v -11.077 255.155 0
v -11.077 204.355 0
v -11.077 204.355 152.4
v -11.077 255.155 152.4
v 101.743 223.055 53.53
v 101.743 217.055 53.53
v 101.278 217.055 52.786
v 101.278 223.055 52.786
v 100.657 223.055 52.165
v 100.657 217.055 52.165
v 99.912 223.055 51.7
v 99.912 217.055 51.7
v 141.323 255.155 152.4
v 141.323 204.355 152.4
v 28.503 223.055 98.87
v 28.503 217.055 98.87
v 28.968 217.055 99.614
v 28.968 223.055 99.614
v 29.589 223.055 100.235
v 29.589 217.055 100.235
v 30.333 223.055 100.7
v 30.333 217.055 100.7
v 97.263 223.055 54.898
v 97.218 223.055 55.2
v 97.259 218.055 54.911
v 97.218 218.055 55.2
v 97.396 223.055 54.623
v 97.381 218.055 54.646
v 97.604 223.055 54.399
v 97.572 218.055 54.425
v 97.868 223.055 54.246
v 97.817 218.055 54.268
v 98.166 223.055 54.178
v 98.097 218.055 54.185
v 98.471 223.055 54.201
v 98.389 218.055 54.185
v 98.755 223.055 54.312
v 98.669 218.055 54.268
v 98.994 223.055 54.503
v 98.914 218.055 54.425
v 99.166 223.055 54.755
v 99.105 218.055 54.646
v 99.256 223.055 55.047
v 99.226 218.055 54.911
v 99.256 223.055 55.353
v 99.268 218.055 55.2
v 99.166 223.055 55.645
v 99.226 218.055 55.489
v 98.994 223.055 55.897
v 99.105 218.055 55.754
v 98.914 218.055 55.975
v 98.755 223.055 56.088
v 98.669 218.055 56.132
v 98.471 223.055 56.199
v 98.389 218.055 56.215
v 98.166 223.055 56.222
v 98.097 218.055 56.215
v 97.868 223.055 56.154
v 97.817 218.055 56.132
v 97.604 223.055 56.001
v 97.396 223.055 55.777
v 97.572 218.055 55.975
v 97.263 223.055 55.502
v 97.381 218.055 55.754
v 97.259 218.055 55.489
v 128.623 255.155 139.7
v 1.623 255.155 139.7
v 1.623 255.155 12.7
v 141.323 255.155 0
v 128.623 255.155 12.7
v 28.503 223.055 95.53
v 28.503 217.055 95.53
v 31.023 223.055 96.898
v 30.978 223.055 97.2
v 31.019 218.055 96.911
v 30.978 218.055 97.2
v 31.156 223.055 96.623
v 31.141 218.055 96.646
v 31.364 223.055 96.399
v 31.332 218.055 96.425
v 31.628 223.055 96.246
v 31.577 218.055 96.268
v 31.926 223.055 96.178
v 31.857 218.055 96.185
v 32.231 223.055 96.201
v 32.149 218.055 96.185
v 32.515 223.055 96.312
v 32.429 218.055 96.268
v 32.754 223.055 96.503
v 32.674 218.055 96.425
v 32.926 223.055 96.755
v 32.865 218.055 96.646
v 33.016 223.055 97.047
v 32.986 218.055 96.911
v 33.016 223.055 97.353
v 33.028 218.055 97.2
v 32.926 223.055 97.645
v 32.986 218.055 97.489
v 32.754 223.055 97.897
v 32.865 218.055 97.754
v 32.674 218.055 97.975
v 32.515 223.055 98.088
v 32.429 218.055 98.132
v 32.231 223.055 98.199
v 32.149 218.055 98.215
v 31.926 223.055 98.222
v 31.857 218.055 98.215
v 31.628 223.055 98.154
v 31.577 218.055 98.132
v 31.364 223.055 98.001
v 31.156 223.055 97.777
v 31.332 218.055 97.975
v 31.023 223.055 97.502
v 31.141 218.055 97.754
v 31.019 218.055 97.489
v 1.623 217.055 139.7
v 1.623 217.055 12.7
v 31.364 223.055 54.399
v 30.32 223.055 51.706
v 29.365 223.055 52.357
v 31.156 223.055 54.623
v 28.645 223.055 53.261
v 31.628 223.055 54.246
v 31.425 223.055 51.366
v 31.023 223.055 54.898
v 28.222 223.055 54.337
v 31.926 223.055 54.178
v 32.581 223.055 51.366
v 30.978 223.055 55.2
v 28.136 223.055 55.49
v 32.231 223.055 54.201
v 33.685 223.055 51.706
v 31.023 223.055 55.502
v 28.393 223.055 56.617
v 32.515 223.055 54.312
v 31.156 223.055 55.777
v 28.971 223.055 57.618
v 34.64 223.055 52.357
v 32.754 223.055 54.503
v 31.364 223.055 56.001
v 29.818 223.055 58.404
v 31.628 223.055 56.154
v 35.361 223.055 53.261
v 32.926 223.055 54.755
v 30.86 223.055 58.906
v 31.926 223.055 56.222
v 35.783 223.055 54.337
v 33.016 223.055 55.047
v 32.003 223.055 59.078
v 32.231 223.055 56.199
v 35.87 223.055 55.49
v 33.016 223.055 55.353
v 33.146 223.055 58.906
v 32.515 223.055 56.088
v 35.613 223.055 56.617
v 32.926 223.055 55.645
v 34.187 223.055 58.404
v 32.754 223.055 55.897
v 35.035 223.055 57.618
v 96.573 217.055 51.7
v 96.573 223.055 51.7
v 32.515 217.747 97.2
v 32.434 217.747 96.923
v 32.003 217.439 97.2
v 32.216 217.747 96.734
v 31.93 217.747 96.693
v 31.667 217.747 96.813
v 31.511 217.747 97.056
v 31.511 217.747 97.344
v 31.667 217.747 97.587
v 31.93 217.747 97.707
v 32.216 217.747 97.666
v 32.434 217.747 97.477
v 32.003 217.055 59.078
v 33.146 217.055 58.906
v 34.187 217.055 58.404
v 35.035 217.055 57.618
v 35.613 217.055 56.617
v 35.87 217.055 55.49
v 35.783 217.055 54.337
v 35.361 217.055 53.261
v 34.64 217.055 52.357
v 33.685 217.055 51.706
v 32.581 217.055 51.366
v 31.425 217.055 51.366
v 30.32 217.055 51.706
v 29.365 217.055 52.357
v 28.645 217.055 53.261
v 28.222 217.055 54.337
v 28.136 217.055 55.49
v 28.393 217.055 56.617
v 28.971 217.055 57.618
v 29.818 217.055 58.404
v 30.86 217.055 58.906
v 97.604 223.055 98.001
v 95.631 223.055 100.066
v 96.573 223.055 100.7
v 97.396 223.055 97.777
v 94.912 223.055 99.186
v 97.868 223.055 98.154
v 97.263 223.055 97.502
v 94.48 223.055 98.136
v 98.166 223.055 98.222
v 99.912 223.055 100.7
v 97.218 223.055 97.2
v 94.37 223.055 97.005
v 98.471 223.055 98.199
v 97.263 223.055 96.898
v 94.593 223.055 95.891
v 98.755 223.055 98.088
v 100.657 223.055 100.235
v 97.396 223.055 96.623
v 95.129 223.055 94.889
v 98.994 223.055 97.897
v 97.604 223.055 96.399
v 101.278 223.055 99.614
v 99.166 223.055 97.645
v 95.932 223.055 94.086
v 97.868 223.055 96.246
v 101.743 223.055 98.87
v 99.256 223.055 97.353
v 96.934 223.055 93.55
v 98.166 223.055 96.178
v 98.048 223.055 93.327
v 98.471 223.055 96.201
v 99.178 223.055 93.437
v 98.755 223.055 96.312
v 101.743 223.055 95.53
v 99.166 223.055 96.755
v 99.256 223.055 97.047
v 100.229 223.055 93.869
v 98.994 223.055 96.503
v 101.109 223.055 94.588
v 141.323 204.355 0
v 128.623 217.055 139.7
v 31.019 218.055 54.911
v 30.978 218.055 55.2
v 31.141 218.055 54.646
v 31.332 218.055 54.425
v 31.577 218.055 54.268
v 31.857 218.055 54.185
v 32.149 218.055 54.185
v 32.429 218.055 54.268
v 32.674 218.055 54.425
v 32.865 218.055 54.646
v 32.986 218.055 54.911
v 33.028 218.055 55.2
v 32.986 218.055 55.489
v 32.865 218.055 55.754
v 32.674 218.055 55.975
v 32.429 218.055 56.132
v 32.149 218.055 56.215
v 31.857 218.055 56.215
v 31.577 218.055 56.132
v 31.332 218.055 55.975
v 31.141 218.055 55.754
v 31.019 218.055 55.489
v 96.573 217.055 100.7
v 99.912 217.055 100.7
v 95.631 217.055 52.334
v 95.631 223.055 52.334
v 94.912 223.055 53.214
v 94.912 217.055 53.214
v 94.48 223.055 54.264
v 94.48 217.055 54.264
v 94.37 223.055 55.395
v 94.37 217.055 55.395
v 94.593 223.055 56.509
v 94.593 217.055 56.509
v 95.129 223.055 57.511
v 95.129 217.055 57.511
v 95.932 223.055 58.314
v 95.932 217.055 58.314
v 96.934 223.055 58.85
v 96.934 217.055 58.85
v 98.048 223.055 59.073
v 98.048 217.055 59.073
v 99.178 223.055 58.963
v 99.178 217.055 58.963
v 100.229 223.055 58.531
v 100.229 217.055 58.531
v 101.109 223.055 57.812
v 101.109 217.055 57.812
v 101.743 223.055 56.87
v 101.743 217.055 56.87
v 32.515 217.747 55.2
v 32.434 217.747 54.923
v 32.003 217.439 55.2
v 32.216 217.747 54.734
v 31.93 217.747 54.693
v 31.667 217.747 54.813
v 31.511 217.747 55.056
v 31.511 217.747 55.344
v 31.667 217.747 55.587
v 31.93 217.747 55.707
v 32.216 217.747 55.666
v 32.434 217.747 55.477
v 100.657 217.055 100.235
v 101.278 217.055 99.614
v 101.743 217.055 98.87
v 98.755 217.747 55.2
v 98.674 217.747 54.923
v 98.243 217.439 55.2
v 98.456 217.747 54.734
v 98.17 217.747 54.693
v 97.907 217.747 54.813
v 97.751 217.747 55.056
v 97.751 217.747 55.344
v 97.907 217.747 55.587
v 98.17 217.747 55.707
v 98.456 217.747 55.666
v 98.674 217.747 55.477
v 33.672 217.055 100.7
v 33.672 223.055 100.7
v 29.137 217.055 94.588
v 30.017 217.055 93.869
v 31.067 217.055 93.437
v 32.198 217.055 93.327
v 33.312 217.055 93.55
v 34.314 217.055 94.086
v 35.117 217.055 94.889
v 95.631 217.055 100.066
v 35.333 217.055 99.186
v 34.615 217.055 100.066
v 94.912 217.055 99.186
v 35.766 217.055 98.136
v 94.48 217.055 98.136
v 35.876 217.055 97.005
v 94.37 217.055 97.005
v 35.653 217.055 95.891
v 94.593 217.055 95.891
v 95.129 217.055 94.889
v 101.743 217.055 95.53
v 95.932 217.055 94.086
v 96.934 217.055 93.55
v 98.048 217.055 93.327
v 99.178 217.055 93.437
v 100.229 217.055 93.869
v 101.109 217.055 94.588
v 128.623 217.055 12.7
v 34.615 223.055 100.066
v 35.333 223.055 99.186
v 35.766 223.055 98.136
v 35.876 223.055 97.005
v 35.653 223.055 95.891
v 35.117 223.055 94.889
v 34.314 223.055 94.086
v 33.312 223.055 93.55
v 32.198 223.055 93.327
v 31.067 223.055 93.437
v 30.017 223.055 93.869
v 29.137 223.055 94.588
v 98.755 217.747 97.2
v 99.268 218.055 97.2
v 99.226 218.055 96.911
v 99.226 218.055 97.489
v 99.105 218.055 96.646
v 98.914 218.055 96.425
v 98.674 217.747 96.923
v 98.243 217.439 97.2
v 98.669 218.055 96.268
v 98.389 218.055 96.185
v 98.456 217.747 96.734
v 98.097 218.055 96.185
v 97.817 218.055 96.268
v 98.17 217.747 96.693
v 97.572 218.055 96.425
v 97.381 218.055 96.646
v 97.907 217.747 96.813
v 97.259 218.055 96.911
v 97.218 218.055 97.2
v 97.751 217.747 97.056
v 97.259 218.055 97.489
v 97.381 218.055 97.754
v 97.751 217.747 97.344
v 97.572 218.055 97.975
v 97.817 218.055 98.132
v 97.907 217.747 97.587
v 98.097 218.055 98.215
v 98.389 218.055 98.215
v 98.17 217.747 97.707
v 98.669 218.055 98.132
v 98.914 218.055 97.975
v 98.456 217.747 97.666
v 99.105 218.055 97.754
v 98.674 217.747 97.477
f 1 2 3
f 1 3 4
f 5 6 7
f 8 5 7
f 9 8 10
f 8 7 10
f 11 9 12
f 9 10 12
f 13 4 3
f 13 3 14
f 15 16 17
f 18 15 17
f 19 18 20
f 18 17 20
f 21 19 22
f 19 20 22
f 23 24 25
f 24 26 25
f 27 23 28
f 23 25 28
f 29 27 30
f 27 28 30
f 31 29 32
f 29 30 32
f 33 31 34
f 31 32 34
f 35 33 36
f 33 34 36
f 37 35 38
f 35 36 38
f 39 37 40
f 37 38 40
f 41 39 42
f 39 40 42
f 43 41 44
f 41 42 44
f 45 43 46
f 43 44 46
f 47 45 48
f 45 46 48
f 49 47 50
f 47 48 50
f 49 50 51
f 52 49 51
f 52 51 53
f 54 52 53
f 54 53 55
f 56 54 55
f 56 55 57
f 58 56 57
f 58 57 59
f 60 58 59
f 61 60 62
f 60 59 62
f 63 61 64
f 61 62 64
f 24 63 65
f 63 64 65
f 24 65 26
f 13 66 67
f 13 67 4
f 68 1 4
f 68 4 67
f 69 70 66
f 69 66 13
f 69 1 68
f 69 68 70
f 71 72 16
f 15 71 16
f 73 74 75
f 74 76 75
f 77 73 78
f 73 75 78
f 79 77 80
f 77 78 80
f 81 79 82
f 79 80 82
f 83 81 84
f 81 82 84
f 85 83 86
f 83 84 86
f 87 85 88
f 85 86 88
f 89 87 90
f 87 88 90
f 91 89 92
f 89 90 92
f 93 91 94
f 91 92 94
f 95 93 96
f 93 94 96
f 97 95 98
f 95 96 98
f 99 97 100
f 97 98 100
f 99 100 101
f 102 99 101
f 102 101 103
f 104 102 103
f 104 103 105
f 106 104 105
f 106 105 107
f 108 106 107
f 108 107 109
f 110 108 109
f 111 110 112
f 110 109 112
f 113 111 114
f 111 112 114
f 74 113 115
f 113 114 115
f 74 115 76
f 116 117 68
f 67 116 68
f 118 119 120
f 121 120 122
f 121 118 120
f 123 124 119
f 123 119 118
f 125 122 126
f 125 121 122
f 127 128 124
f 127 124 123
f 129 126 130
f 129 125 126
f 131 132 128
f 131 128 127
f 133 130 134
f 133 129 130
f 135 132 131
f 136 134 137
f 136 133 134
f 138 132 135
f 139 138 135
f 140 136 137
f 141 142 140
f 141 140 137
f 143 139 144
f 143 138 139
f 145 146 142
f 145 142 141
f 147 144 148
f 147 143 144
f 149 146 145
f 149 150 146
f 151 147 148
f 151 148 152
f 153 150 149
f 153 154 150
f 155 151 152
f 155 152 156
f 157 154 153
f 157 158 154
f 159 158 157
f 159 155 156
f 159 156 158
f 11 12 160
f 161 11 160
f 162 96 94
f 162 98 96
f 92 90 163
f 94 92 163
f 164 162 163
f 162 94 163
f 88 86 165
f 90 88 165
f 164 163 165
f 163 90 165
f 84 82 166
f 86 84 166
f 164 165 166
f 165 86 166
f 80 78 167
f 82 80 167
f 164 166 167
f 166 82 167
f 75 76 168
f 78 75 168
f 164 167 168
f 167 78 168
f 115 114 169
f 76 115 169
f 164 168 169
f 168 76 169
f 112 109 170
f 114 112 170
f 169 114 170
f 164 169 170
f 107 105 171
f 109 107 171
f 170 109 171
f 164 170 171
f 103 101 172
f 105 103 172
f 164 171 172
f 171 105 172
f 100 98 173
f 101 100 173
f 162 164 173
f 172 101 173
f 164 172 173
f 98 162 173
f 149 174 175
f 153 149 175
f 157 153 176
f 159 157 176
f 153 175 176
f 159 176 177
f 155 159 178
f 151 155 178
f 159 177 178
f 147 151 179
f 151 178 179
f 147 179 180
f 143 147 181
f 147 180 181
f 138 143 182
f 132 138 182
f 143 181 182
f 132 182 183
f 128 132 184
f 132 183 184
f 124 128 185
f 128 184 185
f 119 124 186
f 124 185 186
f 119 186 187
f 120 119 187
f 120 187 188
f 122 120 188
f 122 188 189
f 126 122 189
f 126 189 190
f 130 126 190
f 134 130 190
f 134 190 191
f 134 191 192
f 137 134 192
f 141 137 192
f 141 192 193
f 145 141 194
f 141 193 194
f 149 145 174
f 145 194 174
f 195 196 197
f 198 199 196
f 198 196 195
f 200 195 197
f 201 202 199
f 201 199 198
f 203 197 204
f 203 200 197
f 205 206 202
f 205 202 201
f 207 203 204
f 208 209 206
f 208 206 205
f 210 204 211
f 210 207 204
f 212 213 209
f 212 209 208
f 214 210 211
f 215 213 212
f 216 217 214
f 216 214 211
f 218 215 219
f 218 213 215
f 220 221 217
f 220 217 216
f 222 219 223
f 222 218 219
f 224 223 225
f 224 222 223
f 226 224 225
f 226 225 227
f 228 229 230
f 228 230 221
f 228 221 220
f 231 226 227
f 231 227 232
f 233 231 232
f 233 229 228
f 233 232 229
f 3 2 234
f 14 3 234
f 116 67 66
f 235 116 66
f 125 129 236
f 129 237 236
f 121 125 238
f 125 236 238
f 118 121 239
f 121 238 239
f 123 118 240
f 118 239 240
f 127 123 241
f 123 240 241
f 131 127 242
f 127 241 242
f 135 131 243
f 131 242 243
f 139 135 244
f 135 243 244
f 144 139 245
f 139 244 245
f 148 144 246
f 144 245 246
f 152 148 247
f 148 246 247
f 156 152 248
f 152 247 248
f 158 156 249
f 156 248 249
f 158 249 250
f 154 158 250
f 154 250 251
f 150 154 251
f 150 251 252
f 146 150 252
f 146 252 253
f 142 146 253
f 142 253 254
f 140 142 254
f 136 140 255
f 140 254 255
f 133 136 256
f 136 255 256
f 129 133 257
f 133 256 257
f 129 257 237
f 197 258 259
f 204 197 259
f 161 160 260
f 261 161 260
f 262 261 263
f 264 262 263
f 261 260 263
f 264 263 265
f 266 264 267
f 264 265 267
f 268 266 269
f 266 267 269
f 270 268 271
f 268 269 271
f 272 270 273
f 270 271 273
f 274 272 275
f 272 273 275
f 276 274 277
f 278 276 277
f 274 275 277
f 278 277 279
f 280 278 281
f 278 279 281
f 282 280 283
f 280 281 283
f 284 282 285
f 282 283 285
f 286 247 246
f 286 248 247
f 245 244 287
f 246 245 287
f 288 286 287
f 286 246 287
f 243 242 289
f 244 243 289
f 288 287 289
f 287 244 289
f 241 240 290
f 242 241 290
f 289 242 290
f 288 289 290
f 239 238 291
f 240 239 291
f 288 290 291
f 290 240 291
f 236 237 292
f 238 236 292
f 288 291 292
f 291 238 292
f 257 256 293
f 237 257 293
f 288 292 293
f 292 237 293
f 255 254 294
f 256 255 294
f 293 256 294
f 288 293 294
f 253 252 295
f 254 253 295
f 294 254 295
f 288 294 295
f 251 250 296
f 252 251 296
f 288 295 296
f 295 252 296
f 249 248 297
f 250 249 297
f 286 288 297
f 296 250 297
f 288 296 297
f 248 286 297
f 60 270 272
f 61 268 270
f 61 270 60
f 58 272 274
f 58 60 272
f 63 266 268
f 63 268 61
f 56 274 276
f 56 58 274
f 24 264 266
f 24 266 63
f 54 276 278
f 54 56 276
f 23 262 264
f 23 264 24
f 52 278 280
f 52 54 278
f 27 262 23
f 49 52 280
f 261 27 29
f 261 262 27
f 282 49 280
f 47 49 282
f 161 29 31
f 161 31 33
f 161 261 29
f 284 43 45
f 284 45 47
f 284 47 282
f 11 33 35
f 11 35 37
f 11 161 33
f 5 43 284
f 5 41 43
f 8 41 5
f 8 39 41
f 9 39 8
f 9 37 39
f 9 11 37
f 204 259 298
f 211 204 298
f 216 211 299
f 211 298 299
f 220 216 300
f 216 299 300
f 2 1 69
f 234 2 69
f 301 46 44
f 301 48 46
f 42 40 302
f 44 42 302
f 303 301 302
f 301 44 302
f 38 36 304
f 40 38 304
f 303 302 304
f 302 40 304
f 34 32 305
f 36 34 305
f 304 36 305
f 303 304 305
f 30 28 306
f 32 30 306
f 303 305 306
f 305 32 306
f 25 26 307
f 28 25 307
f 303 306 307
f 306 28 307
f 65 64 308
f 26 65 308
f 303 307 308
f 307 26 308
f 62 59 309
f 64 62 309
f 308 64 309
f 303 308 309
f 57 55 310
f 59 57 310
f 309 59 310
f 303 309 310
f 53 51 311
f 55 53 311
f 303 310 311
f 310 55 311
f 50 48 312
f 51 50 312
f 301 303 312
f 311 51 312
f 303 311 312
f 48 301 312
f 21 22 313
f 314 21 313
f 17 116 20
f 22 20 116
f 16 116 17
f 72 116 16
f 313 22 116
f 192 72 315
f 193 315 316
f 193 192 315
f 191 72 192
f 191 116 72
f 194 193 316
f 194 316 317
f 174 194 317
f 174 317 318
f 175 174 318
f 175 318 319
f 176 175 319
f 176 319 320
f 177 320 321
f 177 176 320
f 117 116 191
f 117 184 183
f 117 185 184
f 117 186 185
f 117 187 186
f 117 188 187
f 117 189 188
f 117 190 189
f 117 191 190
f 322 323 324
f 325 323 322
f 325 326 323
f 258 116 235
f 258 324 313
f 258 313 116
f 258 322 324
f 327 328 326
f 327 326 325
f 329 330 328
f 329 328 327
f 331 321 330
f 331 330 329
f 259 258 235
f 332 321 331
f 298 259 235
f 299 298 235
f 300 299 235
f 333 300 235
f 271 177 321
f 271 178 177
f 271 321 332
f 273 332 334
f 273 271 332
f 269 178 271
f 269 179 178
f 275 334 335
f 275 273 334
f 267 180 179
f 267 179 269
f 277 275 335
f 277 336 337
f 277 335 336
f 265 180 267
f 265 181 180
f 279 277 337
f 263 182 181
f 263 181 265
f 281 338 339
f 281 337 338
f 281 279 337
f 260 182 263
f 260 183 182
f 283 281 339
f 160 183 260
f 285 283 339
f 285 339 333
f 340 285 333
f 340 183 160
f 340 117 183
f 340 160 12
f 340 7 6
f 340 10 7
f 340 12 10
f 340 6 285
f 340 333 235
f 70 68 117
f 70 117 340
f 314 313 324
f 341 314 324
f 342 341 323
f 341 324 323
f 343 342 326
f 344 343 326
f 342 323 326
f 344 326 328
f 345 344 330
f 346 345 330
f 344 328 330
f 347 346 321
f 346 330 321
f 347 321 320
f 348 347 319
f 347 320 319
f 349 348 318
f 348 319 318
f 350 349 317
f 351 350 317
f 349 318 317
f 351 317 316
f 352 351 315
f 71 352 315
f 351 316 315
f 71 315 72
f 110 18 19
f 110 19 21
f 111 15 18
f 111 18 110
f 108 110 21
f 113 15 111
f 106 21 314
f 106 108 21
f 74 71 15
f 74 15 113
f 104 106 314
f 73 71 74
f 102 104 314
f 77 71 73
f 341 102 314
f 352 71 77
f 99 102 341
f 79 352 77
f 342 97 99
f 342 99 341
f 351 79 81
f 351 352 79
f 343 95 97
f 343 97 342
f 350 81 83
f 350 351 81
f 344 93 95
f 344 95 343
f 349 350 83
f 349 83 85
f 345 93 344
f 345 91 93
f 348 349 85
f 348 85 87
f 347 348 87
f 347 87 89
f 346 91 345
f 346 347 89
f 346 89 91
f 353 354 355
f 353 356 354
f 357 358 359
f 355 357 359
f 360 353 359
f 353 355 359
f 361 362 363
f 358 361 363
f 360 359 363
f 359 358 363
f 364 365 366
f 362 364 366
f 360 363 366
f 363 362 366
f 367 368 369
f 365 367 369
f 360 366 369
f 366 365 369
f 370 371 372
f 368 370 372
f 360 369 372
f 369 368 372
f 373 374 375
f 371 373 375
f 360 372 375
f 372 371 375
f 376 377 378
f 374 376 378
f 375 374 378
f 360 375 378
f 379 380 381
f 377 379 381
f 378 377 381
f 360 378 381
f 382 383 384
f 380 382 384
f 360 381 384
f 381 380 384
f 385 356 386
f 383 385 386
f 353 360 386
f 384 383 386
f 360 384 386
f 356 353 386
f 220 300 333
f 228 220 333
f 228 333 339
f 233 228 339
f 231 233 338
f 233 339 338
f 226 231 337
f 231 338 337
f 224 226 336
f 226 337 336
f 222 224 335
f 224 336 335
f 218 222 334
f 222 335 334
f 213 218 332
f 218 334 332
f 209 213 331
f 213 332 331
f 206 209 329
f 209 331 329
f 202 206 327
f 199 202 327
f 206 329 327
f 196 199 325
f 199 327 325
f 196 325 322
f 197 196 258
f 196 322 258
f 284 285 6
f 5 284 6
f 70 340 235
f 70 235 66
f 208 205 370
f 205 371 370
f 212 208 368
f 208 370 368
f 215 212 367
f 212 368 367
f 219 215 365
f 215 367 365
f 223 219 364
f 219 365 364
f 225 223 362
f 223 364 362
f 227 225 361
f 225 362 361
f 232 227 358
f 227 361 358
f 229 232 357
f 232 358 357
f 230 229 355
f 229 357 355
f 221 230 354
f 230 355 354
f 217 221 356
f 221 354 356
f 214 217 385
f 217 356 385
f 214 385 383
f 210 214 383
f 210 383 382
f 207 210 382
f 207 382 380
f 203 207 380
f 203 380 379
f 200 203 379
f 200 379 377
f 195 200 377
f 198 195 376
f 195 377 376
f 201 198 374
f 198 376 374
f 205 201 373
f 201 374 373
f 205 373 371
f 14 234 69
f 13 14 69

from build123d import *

# Parameters (mm, degrees)
SKETCH1_W                    = 152.4
SKETCH1_H                    = 50.8
BOSS_EXTRUDE2_DEPTH          = 152.4
SHELL1_T                     = -12.7
SKETCH2_R                    = 3.877794573
BOSS_EXTRUDE3_DEPTH          = 6
M2_5X0_45_TAPPED_HOLE3_D     = 2.05
M2_5X0_45_TAPPED_HOLE3_DEPTH = 4.99999
M2_5X0_45_TAPPED_HOLE3_TIP   = 0.615882135


with BuildPart() as part:
    # Sketch1 → Boss-Extrude2 (new body)
    with BuildSketch(Plane.XY):
        with Locations((65.122807232, 229.754701441)):
            Rectangle(SKETCH1_W, SKETCH1_H)
    extrude(amount=BOSS_EXTRUDE2_DEPTH)

    # Shell1
    shell1_openings = [part.faces().sort_by_distance(p)[0] for p in [
        (65.122807232, 255.154701441, 76.2),
    ]]
    offset(amount=SHELL1_T, openings=shell1_openings, kind=Kind.INTERSECTION)

    # Sketch2 → Boss-Extrude3 (add)
    with BuildSketch(Plane(origin=(0, 217.054701441, 0), x_dir=(1, 0, 0), z_dir=(0, 1, 0))):
        with Locations(Location((32.002807193, -55.2, 0), (0, 0, 270))):
            Circle(SKETCH2_R)
        with BuildLine():
            Line((99.91232539, -51.7), (96.573289151, -51.7))
            ThreePointArc((96.573289151, -51.7), (95.500792432, -57.942014839), (101.742807271, -56.869518119))
            Line((101.742807271, -56.869518119), (101.742807271, -53.530481881))
            ThreePointArc((101.742807271, -53.530481881), (100.984822109, -52.457985161), (99.91232539, -51.7))
        make_face()
        with BuildLine():
            ThreePointArc((33.672325312, -100.7), (34.744822031, -94.457985161), (28.502807193, -95.530481881))
            Line((28.502807193, -95.530481881), (28.502807193, -98.869518119))
            ThreePointArc((28.502807193, -98.869518119), (29.260792354, -99.942014839), (30.333289073, -100.7))
            Line((30.333289073, -100.7), (33.672325312, -100.7))
        make_face()
        with BuildLine():
            Line((101.742807271, -98.869518119), (101.742807271, -95.530481881))
            ThreePointArc((101.742807271, -95.530481881), (95.500792432, -94.457985161), (96.573289151, -100.7))
            Line((96.573289151, -100.7), (99.91232539, -100.7))
            ThreePointArc((99.91232539, -100.7), (100.984822109, -99.942014839), (101.742807271, -98.869518119))
        make_face()
    extrude(amount=BOSS_EXTRUDE3_DEPTH)

    # M2.5x0.45 Tapped Hole3
    with Locations(Plane(origin=(0, 223.054701441, 0), x_dir=(1, 0, 0), z_dir=(0, 1, 0))):
        with Locations((32.002807193, -55.2), (98.242807271, -55.2), (98.242807271, -97.2), (32.002807193, -97.2)):
            Hole(M2_5X0_45_TAPPED_HOLE3_D / 2, depth=M2_5X0_45_TAPPED_HOLE3_DEPTH)
            with Locations((0, 0, -(M2_5X0_45_TAPPED_HOLE3_DEPTH + M2_5X0_45_TAPPED_HOLE3_TIP / 2))):  # 118° drill point
                Cone(0, M2_5X0_45_TAPPED_HOLE3_D / 2, M2_5X0_45_TAPPED_HOLE3_TIP, mode=Mode.SUBTRACT)


solid = part.part
